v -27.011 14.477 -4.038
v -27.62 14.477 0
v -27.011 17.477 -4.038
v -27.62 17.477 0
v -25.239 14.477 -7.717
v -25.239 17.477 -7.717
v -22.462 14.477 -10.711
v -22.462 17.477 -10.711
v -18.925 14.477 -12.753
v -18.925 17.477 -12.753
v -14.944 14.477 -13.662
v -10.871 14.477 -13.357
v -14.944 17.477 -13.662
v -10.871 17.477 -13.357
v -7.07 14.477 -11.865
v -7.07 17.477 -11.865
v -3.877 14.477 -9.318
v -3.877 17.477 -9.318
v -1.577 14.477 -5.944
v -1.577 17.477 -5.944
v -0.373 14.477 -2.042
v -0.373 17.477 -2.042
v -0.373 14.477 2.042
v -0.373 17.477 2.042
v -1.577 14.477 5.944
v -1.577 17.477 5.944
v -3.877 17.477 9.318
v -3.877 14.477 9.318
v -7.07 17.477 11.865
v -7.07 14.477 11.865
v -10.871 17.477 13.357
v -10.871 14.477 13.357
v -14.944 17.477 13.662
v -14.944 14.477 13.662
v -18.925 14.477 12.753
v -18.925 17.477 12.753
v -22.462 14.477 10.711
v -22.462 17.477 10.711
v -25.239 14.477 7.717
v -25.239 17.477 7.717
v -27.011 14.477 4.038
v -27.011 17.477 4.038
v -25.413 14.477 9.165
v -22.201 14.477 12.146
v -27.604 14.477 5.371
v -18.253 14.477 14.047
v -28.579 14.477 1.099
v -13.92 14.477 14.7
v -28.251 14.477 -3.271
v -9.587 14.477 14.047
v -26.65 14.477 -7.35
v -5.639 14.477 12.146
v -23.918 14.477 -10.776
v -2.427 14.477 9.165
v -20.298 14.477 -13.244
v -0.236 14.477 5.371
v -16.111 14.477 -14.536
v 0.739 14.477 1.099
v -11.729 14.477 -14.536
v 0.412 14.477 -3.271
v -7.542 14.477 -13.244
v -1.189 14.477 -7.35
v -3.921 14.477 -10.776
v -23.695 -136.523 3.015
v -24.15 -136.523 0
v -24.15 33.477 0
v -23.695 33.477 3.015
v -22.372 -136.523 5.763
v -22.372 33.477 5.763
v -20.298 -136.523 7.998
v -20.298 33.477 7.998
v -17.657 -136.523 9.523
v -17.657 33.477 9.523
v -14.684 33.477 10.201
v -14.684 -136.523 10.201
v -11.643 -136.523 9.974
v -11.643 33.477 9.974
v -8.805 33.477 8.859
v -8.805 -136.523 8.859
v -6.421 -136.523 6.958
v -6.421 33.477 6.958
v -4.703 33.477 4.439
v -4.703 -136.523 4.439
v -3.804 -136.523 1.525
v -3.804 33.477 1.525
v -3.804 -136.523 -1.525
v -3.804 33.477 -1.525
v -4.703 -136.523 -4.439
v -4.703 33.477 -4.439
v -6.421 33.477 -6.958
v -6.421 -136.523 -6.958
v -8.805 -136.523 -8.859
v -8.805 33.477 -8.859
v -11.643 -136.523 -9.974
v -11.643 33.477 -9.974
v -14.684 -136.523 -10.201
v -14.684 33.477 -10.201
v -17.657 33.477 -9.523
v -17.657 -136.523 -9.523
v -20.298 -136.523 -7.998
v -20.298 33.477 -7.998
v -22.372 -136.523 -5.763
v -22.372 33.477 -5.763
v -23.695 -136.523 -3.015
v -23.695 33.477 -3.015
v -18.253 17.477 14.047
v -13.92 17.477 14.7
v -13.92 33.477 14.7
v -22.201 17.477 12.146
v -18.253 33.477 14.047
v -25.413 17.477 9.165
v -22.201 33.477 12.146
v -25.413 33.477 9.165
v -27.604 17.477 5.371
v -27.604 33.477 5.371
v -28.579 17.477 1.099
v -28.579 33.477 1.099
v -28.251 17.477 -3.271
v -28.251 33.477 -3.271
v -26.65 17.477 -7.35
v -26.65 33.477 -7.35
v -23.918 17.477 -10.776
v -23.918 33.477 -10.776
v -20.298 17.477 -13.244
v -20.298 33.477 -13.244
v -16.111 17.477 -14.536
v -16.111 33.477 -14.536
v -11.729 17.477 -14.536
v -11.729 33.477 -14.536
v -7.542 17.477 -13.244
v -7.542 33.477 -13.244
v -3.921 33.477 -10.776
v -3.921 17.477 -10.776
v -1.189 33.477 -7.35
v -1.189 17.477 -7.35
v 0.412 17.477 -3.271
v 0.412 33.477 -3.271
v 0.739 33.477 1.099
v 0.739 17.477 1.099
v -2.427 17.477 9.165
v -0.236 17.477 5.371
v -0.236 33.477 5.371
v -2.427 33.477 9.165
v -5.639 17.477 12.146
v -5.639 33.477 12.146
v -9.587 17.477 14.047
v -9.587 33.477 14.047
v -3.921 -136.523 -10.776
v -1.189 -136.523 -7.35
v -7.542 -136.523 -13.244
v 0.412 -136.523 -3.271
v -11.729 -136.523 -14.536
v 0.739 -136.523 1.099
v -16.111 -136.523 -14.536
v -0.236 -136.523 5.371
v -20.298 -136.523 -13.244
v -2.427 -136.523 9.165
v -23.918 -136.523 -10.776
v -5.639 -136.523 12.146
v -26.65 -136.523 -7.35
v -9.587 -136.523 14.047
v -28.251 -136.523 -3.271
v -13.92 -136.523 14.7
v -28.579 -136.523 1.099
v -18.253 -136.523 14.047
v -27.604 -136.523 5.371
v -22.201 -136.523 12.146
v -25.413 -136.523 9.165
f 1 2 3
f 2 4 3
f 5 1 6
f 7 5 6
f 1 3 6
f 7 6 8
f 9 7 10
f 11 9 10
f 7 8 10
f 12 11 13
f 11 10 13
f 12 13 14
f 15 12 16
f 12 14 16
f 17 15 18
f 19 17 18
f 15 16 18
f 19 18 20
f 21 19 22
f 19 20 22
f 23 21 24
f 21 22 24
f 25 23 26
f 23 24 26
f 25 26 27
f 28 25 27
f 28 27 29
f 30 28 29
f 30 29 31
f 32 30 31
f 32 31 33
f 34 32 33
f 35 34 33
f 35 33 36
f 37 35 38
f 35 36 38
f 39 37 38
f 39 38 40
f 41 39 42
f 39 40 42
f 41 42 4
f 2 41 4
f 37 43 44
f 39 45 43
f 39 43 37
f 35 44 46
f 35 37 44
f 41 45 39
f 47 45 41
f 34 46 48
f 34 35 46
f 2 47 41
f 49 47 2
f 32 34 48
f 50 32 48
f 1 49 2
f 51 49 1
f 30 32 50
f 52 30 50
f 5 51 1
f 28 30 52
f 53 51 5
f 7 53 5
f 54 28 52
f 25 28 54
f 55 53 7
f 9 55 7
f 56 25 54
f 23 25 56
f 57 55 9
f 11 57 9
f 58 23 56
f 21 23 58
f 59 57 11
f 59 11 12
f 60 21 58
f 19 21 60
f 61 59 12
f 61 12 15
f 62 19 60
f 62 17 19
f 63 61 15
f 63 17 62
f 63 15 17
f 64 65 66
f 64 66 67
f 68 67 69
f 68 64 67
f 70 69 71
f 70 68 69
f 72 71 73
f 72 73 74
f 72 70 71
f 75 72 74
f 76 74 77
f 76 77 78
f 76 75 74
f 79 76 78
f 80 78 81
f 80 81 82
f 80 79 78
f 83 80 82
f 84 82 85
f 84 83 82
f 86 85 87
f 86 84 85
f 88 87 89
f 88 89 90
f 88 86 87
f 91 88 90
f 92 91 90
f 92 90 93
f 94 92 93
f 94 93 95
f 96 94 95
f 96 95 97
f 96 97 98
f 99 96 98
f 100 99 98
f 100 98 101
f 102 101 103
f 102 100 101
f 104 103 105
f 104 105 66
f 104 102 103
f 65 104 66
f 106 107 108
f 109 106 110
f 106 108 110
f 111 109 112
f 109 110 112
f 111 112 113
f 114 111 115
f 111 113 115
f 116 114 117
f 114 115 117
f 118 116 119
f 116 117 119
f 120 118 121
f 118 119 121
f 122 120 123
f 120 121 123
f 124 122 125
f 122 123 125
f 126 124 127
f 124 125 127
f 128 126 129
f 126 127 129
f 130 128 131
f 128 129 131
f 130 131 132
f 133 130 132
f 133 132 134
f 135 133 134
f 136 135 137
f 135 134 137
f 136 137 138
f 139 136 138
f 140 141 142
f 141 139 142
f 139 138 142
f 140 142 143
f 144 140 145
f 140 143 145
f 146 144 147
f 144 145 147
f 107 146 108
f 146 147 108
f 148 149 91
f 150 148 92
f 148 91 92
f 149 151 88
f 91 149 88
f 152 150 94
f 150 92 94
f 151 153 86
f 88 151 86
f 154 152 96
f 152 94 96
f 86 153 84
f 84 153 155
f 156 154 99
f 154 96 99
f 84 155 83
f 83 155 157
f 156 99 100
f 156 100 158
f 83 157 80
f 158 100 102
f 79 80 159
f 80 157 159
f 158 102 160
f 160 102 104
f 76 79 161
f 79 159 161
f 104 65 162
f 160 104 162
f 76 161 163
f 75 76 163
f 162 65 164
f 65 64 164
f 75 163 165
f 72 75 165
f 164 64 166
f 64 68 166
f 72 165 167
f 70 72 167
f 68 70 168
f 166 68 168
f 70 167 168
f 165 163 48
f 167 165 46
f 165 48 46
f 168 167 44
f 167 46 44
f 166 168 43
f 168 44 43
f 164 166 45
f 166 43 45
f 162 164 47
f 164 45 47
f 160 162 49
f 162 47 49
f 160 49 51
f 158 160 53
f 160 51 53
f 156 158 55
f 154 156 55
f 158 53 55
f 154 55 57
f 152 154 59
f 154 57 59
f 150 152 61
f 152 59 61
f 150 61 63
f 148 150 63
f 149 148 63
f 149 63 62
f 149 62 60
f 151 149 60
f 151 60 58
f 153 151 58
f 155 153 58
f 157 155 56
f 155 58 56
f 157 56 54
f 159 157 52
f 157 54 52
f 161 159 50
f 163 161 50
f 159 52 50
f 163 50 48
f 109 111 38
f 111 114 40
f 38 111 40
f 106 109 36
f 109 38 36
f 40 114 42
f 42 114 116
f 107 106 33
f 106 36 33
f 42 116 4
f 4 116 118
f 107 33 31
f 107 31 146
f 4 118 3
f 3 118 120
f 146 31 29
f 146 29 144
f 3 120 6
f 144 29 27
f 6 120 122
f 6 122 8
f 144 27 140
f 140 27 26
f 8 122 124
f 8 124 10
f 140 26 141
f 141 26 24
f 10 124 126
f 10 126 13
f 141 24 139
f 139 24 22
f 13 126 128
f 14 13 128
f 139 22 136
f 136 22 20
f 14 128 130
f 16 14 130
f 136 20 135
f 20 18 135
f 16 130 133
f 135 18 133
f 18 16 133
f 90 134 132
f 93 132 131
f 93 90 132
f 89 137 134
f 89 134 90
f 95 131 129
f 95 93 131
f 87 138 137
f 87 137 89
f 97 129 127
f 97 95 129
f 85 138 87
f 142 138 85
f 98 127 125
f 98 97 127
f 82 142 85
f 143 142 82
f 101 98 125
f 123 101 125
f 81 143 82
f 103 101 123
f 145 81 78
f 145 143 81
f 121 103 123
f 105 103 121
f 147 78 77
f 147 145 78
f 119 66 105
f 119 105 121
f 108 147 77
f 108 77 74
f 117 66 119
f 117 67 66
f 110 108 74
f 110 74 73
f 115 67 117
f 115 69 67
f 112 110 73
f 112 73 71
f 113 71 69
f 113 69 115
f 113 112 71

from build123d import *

# Parameters (mm, degrees)
SKETCH12_R                 = 16
SKETCH12_R_2               = 10.23
MIEMBRO_ESTRUCTURAL1_DEPTH = 170
CROQUIS2_W                 = 15.159083904
CROQUIS2_H                 = 170
CROQUIS3_W                 = 1
CROQUIS3_H                 = 3


with BuildPart() as part:
    # Sketch12 → Miembro estructural1 (new body)
    with BuildSketch(Plane(origin=(-13.919870477, -136.5234375, 0), x_dir=(-1, 0, 0), z_dir=(0, 1, 0))):
        Circle(SKETCH12_R)
        Circle(SKETCH12_R_2, mode=Mode.SUBTRACT)
    extrude(amount=MIEMBRO_ESTRUCTURAL1_DEPTH)

    # Croquis2 → Cortar-Revolución1 (revolve, cut)
    with BuildSketch(Plane.XY, mode=Mode.PRIVATE) as cortar_revoluci_n1_sk:
        with Locations((8.359671475, -51.5234375)):
            Rectangle(CROQUIS2_W, CROQUIS2_H)
    revolve(cortar_revoluci_n1_sk.sketch.rotate(Axis((-13.919870477, 33.4765625, 0), (0, -1, 0)), 90), axis=Axis((-13.919870477, 33.4765625, 0), (0, -1, 0)), mode=Mode.SUBTRACT)

    # Croquis3 → Cortar-Revolución2 (revolve, cut)
    with BuildSketch(Plane.XY, mode=Mode.PRIVATE) as cortar_revoluci_n2_sk:
        with Locations((0.280129523, 15.9765625)):
            Rectangle(CROQUIS3_W, CROQUIS3_H)
    revolve(cortar_revoluci_n2_sk.sketch.rotate(Axis((-13.919870477, 33.4765625, 0), (0, -1, 0)), 180), axis=Axis((-13.919870477, 33.4765625, 0), (0, -1, 0)), mode=Mode.SUBTRACT)


solid = part.part
